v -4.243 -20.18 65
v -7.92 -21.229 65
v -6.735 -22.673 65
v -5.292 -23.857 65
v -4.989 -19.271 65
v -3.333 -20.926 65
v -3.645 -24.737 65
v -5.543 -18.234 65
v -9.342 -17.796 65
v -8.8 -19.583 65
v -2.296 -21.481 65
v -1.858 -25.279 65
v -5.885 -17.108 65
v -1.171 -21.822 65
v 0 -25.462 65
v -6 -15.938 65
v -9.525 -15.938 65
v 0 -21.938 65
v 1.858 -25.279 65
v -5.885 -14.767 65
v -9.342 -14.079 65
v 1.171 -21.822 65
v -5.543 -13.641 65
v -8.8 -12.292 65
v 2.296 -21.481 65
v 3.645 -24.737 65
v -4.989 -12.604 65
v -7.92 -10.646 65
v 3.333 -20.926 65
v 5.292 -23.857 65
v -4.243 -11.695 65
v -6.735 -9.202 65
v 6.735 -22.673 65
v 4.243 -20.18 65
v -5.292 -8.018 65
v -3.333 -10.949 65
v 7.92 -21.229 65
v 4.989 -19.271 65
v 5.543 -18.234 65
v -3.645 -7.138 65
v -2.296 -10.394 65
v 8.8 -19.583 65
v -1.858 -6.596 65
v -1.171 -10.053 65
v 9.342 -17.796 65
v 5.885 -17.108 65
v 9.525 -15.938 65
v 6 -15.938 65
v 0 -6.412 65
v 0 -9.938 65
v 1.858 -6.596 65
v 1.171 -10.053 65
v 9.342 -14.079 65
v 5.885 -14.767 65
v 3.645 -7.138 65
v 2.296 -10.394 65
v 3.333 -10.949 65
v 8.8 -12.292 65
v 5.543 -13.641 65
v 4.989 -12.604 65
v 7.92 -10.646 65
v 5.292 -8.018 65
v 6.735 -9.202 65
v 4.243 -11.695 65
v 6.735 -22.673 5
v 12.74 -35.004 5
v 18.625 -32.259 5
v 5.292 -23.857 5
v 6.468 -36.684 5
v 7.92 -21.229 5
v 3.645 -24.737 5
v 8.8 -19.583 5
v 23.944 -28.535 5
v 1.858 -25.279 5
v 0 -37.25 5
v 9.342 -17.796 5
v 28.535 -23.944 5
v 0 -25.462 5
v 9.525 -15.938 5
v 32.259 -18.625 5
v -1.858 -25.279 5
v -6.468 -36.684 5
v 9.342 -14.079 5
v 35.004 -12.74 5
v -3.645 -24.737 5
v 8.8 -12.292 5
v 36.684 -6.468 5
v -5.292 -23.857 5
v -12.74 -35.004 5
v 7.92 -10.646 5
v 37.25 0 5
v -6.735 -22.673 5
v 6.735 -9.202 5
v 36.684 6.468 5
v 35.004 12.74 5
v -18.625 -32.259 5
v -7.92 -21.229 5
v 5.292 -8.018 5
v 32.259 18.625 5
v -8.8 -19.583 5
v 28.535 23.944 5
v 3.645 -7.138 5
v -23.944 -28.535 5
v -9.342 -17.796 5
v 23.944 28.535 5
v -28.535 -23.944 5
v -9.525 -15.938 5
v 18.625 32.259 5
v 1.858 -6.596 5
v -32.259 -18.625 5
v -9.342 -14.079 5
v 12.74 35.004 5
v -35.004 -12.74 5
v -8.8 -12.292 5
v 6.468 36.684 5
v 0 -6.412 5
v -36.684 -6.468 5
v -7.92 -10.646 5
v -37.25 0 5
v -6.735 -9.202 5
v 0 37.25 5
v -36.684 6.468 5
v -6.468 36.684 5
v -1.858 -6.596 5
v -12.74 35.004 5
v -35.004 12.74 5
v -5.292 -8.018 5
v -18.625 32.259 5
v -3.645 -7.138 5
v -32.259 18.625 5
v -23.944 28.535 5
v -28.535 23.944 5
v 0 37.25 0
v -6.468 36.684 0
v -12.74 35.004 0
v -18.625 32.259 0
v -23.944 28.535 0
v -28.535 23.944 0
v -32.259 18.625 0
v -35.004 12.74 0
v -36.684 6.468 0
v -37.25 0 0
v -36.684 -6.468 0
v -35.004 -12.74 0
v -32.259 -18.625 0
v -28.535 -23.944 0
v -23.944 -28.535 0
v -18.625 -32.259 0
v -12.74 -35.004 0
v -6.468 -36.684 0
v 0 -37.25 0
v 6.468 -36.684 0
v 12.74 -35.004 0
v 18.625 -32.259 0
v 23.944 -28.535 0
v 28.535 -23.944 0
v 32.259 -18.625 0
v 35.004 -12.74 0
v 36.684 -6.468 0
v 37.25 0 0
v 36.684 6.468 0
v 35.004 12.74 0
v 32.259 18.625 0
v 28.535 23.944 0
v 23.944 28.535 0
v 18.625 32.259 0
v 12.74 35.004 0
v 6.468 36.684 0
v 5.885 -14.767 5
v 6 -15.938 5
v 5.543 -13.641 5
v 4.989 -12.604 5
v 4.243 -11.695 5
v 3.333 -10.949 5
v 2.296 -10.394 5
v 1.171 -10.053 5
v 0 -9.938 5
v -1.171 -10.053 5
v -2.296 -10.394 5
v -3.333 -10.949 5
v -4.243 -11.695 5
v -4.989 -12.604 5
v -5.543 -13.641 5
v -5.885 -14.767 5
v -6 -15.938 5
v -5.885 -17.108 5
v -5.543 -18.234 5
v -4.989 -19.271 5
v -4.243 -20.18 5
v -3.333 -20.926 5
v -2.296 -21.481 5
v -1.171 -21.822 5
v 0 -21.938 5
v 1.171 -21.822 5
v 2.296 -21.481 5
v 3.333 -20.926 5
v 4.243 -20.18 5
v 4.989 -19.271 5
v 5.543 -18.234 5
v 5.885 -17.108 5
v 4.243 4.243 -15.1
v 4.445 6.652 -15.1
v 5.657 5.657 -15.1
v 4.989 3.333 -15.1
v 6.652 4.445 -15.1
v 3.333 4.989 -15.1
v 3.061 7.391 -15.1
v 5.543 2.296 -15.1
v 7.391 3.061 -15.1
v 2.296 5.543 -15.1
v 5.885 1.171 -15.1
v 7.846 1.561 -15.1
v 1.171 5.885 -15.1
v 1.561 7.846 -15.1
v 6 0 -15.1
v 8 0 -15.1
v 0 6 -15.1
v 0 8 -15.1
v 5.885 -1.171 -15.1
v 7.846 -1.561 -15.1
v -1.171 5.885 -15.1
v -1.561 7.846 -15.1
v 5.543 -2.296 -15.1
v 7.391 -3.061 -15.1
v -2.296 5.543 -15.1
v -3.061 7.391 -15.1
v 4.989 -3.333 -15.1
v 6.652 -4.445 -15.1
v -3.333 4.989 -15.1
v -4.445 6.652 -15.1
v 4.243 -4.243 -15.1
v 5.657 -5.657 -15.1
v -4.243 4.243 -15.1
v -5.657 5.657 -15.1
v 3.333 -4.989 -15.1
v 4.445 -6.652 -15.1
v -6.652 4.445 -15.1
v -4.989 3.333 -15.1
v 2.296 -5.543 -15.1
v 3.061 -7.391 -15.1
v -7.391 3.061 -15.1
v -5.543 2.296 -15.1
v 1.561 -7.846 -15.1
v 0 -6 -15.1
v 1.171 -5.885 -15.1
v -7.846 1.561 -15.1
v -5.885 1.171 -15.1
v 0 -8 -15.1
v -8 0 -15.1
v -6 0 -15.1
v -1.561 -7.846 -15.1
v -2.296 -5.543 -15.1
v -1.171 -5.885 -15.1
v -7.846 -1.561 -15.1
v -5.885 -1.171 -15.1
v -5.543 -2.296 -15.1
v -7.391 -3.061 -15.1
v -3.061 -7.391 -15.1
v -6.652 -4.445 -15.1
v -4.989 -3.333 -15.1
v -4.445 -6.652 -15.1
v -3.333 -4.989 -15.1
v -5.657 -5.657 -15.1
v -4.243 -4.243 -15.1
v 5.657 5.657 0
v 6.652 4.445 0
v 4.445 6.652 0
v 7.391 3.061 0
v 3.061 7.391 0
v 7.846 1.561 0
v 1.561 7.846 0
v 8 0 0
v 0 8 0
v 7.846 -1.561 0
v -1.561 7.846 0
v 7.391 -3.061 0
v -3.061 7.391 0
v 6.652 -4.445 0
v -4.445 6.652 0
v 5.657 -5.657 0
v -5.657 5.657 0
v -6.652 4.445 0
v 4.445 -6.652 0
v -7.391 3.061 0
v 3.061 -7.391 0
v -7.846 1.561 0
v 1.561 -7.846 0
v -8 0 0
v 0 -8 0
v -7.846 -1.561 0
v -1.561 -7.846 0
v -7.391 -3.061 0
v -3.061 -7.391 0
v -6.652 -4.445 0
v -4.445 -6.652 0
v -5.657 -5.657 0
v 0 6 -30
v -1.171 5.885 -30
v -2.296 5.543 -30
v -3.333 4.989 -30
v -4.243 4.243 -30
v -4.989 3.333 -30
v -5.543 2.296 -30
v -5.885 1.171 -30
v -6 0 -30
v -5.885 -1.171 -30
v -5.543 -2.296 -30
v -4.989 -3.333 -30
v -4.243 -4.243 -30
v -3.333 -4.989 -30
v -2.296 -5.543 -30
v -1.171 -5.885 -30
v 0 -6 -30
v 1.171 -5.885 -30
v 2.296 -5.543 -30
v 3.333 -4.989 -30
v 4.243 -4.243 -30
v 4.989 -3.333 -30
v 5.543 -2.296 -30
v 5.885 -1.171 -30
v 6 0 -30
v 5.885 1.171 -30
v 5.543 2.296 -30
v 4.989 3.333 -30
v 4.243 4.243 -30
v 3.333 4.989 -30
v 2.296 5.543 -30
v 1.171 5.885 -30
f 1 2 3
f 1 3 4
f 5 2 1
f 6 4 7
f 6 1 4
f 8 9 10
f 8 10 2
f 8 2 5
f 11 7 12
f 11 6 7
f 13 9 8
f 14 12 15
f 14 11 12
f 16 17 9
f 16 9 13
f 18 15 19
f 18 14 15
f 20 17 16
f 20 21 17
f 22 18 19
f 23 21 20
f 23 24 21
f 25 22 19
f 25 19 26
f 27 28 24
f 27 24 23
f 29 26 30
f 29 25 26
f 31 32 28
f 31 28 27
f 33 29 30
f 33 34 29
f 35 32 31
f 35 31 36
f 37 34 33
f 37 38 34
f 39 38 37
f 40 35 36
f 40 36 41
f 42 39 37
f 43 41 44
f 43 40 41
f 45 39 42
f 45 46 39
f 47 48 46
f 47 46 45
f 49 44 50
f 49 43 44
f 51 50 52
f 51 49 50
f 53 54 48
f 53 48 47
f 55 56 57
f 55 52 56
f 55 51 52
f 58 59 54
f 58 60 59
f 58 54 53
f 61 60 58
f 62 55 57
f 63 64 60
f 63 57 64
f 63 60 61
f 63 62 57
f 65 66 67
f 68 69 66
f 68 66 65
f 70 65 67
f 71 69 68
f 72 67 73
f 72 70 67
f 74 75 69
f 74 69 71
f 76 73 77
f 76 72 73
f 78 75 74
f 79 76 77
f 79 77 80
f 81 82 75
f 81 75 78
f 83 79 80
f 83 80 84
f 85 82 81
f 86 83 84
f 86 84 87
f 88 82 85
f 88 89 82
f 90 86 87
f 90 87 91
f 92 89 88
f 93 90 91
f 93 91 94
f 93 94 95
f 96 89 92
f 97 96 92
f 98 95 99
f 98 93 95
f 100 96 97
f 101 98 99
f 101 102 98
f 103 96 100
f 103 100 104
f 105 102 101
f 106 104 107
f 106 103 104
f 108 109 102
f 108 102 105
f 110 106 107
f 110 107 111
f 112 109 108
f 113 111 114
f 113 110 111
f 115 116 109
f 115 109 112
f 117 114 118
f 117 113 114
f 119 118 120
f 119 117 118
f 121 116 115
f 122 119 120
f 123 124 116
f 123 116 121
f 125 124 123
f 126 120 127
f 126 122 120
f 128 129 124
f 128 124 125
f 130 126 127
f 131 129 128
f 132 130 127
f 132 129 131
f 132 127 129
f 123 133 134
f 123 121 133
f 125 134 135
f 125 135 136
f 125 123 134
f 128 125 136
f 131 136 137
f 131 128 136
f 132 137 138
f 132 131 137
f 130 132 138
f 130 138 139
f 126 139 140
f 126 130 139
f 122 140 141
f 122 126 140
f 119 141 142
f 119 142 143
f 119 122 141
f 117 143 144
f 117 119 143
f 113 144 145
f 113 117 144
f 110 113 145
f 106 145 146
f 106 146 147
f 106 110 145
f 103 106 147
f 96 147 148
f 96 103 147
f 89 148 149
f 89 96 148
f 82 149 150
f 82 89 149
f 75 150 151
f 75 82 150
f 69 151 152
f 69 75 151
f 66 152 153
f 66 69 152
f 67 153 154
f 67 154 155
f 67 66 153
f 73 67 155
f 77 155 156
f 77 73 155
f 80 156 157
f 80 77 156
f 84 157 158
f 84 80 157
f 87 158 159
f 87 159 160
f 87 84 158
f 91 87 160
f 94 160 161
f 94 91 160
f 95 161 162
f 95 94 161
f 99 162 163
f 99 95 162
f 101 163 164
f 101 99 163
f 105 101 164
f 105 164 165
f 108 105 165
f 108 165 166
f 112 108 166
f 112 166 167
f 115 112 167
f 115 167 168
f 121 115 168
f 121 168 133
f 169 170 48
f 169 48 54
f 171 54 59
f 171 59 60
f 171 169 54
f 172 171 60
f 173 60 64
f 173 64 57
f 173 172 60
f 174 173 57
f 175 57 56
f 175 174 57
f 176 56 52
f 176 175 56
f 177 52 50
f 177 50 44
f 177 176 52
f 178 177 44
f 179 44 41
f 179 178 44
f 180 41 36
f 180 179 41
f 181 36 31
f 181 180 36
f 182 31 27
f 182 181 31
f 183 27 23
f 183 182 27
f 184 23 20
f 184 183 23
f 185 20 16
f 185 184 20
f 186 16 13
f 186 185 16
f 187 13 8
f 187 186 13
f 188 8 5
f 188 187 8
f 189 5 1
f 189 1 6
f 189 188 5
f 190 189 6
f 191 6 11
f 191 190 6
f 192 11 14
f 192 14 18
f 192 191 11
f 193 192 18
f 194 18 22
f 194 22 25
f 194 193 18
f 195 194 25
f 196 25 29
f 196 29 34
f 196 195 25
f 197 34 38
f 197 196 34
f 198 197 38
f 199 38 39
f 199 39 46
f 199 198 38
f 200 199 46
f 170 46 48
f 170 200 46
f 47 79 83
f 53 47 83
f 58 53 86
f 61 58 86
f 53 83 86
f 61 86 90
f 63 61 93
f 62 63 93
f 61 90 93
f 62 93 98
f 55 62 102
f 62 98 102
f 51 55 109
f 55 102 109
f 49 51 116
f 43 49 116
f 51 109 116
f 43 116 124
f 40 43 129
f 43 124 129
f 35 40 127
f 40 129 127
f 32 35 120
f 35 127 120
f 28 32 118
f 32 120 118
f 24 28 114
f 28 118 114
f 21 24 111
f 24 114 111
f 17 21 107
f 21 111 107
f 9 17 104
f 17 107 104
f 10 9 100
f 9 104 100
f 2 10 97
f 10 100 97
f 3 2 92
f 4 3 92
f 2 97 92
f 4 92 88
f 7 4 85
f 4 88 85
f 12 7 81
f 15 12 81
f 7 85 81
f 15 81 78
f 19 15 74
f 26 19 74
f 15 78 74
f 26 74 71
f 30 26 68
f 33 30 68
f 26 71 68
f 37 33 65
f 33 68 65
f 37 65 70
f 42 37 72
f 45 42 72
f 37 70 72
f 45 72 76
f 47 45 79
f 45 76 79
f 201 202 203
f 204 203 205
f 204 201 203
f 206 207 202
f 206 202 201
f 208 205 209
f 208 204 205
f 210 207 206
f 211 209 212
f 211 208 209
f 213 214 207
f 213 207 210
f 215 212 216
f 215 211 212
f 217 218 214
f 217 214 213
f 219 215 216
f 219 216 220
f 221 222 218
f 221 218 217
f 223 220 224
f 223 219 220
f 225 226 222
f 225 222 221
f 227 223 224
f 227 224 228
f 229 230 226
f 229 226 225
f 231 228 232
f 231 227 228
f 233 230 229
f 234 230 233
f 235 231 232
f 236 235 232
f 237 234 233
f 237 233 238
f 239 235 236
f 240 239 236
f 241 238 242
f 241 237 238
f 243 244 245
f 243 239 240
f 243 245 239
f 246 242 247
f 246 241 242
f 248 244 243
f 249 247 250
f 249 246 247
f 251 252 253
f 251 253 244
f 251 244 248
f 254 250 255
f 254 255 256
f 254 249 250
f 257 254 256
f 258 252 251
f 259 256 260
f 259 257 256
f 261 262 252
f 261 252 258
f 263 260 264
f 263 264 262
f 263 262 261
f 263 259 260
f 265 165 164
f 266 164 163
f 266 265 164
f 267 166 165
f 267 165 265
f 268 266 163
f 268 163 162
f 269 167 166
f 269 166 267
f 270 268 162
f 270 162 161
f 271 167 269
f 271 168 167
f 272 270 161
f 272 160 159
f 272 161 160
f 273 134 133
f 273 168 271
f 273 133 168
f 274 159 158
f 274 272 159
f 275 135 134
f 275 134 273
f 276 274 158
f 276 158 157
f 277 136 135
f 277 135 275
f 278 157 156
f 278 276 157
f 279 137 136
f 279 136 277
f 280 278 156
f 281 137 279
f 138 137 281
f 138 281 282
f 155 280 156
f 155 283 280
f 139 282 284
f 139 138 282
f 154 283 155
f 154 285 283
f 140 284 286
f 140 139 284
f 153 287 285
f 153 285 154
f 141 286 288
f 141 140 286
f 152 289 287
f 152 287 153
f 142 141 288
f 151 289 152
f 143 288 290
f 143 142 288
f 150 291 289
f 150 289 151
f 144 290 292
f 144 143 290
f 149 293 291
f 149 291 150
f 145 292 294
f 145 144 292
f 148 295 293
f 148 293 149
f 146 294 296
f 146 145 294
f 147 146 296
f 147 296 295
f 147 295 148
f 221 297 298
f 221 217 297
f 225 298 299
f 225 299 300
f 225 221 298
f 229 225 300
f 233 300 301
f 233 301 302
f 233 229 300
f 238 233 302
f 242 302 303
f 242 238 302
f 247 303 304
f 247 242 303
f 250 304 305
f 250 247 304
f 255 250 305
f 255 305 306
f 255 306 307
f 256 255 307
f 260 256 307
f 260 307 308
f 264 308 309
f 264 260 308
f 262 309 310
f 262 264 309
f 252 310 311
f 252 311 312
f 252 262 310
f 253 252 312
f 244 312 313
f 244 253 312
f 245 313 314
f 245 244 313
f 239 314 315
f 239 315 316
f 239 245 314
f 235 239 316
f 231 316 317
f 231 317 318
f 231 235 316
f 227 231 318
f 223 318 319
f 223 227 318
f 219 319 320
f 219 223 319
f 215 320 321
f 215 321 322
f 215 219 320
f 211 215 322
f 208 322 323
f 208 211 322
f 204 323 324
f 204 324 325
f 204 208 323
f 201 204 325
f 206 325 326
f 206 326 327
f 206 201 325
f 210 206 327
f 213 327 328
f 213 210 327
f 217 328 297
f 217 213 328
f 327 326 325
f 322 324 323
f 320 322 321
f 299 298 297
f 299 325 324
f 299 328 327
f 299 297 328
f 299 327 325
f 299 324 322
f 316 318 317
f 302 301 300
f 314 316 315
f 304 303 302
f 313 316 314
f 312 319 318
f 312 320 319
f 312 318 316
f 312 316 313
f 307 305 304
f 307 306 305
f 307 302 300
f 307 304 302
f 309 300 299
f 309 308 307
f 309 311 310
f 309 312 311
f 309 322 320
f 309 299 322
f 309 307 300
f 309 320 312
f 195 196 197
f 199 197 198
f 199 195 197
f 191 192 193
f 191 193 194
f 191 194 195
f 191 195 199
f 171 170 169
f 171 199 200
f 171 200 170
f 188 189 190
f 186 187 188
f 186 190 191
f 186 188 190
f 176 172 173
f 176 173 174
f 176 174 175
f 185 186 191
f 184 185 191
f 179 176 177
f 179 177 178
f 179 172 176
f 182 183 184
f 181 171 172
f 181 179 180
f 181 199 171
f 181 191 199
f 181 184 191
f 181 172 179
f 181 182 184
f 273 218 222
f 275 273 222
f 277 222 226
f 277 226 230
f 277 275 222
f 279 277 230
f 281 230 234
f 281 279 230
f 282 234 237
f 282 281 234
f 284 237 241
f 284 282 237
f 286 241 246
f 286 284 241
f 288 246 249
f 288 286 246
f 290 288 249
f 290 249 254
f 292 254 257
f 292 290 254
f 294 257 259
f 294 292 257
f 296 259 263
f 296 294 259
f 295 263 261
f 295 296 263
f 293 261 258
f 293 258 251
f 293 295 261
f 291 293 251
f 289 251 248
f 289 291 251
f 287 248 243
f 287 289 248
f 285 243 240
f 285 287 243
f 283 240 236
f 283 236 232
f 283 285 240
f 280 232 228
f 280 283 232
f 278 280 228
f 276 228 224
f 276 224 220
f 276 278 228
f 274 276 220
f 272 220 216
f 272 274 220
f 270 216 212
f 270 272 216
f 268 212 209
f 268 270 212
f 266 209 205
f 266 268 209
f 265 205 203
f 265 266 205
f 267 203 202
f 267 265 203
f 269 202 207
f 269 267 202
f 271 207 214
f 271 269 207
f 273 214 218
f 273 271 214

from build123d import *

# Parameters (mm, degrees)
SKETCH2_R           = 9.525
SKETCH2_R_2         = 6
BOSS_EXTRUDE1_DEPTH = 60


with BuildPart() as part:
    # Sketch1 → Revolve1 (revolve)
    with BuildSketch(Plane(origin=(0, 0, 0), x_dir=(0, 0, -1), z_dir=(1, 0, 0))):
        Polygon((0, 8), (0, 37.25), (-5, 37.25), (-5, 0), (30, 0), (30, 6), (15.1, 6), (15.1, 8), align=None)
    revolve(axis=Axis((0, 0, -30), (0, 0, 1)))

    # Sketch2 → Boss-Extrude1 (add)
    with BuildSketch(Plane.XY.offset(5)):
        with Locations((0, -15.9375)):
            Circle(SKETCH2_R)
        with Locations((0, -15.9375)):
            Circle(SKETCH2_R_2, mode=Mode.SUBTRACT)
    extrude(amount=BOSS_EXTRUDE1_DEPTH)


solid = part.part
